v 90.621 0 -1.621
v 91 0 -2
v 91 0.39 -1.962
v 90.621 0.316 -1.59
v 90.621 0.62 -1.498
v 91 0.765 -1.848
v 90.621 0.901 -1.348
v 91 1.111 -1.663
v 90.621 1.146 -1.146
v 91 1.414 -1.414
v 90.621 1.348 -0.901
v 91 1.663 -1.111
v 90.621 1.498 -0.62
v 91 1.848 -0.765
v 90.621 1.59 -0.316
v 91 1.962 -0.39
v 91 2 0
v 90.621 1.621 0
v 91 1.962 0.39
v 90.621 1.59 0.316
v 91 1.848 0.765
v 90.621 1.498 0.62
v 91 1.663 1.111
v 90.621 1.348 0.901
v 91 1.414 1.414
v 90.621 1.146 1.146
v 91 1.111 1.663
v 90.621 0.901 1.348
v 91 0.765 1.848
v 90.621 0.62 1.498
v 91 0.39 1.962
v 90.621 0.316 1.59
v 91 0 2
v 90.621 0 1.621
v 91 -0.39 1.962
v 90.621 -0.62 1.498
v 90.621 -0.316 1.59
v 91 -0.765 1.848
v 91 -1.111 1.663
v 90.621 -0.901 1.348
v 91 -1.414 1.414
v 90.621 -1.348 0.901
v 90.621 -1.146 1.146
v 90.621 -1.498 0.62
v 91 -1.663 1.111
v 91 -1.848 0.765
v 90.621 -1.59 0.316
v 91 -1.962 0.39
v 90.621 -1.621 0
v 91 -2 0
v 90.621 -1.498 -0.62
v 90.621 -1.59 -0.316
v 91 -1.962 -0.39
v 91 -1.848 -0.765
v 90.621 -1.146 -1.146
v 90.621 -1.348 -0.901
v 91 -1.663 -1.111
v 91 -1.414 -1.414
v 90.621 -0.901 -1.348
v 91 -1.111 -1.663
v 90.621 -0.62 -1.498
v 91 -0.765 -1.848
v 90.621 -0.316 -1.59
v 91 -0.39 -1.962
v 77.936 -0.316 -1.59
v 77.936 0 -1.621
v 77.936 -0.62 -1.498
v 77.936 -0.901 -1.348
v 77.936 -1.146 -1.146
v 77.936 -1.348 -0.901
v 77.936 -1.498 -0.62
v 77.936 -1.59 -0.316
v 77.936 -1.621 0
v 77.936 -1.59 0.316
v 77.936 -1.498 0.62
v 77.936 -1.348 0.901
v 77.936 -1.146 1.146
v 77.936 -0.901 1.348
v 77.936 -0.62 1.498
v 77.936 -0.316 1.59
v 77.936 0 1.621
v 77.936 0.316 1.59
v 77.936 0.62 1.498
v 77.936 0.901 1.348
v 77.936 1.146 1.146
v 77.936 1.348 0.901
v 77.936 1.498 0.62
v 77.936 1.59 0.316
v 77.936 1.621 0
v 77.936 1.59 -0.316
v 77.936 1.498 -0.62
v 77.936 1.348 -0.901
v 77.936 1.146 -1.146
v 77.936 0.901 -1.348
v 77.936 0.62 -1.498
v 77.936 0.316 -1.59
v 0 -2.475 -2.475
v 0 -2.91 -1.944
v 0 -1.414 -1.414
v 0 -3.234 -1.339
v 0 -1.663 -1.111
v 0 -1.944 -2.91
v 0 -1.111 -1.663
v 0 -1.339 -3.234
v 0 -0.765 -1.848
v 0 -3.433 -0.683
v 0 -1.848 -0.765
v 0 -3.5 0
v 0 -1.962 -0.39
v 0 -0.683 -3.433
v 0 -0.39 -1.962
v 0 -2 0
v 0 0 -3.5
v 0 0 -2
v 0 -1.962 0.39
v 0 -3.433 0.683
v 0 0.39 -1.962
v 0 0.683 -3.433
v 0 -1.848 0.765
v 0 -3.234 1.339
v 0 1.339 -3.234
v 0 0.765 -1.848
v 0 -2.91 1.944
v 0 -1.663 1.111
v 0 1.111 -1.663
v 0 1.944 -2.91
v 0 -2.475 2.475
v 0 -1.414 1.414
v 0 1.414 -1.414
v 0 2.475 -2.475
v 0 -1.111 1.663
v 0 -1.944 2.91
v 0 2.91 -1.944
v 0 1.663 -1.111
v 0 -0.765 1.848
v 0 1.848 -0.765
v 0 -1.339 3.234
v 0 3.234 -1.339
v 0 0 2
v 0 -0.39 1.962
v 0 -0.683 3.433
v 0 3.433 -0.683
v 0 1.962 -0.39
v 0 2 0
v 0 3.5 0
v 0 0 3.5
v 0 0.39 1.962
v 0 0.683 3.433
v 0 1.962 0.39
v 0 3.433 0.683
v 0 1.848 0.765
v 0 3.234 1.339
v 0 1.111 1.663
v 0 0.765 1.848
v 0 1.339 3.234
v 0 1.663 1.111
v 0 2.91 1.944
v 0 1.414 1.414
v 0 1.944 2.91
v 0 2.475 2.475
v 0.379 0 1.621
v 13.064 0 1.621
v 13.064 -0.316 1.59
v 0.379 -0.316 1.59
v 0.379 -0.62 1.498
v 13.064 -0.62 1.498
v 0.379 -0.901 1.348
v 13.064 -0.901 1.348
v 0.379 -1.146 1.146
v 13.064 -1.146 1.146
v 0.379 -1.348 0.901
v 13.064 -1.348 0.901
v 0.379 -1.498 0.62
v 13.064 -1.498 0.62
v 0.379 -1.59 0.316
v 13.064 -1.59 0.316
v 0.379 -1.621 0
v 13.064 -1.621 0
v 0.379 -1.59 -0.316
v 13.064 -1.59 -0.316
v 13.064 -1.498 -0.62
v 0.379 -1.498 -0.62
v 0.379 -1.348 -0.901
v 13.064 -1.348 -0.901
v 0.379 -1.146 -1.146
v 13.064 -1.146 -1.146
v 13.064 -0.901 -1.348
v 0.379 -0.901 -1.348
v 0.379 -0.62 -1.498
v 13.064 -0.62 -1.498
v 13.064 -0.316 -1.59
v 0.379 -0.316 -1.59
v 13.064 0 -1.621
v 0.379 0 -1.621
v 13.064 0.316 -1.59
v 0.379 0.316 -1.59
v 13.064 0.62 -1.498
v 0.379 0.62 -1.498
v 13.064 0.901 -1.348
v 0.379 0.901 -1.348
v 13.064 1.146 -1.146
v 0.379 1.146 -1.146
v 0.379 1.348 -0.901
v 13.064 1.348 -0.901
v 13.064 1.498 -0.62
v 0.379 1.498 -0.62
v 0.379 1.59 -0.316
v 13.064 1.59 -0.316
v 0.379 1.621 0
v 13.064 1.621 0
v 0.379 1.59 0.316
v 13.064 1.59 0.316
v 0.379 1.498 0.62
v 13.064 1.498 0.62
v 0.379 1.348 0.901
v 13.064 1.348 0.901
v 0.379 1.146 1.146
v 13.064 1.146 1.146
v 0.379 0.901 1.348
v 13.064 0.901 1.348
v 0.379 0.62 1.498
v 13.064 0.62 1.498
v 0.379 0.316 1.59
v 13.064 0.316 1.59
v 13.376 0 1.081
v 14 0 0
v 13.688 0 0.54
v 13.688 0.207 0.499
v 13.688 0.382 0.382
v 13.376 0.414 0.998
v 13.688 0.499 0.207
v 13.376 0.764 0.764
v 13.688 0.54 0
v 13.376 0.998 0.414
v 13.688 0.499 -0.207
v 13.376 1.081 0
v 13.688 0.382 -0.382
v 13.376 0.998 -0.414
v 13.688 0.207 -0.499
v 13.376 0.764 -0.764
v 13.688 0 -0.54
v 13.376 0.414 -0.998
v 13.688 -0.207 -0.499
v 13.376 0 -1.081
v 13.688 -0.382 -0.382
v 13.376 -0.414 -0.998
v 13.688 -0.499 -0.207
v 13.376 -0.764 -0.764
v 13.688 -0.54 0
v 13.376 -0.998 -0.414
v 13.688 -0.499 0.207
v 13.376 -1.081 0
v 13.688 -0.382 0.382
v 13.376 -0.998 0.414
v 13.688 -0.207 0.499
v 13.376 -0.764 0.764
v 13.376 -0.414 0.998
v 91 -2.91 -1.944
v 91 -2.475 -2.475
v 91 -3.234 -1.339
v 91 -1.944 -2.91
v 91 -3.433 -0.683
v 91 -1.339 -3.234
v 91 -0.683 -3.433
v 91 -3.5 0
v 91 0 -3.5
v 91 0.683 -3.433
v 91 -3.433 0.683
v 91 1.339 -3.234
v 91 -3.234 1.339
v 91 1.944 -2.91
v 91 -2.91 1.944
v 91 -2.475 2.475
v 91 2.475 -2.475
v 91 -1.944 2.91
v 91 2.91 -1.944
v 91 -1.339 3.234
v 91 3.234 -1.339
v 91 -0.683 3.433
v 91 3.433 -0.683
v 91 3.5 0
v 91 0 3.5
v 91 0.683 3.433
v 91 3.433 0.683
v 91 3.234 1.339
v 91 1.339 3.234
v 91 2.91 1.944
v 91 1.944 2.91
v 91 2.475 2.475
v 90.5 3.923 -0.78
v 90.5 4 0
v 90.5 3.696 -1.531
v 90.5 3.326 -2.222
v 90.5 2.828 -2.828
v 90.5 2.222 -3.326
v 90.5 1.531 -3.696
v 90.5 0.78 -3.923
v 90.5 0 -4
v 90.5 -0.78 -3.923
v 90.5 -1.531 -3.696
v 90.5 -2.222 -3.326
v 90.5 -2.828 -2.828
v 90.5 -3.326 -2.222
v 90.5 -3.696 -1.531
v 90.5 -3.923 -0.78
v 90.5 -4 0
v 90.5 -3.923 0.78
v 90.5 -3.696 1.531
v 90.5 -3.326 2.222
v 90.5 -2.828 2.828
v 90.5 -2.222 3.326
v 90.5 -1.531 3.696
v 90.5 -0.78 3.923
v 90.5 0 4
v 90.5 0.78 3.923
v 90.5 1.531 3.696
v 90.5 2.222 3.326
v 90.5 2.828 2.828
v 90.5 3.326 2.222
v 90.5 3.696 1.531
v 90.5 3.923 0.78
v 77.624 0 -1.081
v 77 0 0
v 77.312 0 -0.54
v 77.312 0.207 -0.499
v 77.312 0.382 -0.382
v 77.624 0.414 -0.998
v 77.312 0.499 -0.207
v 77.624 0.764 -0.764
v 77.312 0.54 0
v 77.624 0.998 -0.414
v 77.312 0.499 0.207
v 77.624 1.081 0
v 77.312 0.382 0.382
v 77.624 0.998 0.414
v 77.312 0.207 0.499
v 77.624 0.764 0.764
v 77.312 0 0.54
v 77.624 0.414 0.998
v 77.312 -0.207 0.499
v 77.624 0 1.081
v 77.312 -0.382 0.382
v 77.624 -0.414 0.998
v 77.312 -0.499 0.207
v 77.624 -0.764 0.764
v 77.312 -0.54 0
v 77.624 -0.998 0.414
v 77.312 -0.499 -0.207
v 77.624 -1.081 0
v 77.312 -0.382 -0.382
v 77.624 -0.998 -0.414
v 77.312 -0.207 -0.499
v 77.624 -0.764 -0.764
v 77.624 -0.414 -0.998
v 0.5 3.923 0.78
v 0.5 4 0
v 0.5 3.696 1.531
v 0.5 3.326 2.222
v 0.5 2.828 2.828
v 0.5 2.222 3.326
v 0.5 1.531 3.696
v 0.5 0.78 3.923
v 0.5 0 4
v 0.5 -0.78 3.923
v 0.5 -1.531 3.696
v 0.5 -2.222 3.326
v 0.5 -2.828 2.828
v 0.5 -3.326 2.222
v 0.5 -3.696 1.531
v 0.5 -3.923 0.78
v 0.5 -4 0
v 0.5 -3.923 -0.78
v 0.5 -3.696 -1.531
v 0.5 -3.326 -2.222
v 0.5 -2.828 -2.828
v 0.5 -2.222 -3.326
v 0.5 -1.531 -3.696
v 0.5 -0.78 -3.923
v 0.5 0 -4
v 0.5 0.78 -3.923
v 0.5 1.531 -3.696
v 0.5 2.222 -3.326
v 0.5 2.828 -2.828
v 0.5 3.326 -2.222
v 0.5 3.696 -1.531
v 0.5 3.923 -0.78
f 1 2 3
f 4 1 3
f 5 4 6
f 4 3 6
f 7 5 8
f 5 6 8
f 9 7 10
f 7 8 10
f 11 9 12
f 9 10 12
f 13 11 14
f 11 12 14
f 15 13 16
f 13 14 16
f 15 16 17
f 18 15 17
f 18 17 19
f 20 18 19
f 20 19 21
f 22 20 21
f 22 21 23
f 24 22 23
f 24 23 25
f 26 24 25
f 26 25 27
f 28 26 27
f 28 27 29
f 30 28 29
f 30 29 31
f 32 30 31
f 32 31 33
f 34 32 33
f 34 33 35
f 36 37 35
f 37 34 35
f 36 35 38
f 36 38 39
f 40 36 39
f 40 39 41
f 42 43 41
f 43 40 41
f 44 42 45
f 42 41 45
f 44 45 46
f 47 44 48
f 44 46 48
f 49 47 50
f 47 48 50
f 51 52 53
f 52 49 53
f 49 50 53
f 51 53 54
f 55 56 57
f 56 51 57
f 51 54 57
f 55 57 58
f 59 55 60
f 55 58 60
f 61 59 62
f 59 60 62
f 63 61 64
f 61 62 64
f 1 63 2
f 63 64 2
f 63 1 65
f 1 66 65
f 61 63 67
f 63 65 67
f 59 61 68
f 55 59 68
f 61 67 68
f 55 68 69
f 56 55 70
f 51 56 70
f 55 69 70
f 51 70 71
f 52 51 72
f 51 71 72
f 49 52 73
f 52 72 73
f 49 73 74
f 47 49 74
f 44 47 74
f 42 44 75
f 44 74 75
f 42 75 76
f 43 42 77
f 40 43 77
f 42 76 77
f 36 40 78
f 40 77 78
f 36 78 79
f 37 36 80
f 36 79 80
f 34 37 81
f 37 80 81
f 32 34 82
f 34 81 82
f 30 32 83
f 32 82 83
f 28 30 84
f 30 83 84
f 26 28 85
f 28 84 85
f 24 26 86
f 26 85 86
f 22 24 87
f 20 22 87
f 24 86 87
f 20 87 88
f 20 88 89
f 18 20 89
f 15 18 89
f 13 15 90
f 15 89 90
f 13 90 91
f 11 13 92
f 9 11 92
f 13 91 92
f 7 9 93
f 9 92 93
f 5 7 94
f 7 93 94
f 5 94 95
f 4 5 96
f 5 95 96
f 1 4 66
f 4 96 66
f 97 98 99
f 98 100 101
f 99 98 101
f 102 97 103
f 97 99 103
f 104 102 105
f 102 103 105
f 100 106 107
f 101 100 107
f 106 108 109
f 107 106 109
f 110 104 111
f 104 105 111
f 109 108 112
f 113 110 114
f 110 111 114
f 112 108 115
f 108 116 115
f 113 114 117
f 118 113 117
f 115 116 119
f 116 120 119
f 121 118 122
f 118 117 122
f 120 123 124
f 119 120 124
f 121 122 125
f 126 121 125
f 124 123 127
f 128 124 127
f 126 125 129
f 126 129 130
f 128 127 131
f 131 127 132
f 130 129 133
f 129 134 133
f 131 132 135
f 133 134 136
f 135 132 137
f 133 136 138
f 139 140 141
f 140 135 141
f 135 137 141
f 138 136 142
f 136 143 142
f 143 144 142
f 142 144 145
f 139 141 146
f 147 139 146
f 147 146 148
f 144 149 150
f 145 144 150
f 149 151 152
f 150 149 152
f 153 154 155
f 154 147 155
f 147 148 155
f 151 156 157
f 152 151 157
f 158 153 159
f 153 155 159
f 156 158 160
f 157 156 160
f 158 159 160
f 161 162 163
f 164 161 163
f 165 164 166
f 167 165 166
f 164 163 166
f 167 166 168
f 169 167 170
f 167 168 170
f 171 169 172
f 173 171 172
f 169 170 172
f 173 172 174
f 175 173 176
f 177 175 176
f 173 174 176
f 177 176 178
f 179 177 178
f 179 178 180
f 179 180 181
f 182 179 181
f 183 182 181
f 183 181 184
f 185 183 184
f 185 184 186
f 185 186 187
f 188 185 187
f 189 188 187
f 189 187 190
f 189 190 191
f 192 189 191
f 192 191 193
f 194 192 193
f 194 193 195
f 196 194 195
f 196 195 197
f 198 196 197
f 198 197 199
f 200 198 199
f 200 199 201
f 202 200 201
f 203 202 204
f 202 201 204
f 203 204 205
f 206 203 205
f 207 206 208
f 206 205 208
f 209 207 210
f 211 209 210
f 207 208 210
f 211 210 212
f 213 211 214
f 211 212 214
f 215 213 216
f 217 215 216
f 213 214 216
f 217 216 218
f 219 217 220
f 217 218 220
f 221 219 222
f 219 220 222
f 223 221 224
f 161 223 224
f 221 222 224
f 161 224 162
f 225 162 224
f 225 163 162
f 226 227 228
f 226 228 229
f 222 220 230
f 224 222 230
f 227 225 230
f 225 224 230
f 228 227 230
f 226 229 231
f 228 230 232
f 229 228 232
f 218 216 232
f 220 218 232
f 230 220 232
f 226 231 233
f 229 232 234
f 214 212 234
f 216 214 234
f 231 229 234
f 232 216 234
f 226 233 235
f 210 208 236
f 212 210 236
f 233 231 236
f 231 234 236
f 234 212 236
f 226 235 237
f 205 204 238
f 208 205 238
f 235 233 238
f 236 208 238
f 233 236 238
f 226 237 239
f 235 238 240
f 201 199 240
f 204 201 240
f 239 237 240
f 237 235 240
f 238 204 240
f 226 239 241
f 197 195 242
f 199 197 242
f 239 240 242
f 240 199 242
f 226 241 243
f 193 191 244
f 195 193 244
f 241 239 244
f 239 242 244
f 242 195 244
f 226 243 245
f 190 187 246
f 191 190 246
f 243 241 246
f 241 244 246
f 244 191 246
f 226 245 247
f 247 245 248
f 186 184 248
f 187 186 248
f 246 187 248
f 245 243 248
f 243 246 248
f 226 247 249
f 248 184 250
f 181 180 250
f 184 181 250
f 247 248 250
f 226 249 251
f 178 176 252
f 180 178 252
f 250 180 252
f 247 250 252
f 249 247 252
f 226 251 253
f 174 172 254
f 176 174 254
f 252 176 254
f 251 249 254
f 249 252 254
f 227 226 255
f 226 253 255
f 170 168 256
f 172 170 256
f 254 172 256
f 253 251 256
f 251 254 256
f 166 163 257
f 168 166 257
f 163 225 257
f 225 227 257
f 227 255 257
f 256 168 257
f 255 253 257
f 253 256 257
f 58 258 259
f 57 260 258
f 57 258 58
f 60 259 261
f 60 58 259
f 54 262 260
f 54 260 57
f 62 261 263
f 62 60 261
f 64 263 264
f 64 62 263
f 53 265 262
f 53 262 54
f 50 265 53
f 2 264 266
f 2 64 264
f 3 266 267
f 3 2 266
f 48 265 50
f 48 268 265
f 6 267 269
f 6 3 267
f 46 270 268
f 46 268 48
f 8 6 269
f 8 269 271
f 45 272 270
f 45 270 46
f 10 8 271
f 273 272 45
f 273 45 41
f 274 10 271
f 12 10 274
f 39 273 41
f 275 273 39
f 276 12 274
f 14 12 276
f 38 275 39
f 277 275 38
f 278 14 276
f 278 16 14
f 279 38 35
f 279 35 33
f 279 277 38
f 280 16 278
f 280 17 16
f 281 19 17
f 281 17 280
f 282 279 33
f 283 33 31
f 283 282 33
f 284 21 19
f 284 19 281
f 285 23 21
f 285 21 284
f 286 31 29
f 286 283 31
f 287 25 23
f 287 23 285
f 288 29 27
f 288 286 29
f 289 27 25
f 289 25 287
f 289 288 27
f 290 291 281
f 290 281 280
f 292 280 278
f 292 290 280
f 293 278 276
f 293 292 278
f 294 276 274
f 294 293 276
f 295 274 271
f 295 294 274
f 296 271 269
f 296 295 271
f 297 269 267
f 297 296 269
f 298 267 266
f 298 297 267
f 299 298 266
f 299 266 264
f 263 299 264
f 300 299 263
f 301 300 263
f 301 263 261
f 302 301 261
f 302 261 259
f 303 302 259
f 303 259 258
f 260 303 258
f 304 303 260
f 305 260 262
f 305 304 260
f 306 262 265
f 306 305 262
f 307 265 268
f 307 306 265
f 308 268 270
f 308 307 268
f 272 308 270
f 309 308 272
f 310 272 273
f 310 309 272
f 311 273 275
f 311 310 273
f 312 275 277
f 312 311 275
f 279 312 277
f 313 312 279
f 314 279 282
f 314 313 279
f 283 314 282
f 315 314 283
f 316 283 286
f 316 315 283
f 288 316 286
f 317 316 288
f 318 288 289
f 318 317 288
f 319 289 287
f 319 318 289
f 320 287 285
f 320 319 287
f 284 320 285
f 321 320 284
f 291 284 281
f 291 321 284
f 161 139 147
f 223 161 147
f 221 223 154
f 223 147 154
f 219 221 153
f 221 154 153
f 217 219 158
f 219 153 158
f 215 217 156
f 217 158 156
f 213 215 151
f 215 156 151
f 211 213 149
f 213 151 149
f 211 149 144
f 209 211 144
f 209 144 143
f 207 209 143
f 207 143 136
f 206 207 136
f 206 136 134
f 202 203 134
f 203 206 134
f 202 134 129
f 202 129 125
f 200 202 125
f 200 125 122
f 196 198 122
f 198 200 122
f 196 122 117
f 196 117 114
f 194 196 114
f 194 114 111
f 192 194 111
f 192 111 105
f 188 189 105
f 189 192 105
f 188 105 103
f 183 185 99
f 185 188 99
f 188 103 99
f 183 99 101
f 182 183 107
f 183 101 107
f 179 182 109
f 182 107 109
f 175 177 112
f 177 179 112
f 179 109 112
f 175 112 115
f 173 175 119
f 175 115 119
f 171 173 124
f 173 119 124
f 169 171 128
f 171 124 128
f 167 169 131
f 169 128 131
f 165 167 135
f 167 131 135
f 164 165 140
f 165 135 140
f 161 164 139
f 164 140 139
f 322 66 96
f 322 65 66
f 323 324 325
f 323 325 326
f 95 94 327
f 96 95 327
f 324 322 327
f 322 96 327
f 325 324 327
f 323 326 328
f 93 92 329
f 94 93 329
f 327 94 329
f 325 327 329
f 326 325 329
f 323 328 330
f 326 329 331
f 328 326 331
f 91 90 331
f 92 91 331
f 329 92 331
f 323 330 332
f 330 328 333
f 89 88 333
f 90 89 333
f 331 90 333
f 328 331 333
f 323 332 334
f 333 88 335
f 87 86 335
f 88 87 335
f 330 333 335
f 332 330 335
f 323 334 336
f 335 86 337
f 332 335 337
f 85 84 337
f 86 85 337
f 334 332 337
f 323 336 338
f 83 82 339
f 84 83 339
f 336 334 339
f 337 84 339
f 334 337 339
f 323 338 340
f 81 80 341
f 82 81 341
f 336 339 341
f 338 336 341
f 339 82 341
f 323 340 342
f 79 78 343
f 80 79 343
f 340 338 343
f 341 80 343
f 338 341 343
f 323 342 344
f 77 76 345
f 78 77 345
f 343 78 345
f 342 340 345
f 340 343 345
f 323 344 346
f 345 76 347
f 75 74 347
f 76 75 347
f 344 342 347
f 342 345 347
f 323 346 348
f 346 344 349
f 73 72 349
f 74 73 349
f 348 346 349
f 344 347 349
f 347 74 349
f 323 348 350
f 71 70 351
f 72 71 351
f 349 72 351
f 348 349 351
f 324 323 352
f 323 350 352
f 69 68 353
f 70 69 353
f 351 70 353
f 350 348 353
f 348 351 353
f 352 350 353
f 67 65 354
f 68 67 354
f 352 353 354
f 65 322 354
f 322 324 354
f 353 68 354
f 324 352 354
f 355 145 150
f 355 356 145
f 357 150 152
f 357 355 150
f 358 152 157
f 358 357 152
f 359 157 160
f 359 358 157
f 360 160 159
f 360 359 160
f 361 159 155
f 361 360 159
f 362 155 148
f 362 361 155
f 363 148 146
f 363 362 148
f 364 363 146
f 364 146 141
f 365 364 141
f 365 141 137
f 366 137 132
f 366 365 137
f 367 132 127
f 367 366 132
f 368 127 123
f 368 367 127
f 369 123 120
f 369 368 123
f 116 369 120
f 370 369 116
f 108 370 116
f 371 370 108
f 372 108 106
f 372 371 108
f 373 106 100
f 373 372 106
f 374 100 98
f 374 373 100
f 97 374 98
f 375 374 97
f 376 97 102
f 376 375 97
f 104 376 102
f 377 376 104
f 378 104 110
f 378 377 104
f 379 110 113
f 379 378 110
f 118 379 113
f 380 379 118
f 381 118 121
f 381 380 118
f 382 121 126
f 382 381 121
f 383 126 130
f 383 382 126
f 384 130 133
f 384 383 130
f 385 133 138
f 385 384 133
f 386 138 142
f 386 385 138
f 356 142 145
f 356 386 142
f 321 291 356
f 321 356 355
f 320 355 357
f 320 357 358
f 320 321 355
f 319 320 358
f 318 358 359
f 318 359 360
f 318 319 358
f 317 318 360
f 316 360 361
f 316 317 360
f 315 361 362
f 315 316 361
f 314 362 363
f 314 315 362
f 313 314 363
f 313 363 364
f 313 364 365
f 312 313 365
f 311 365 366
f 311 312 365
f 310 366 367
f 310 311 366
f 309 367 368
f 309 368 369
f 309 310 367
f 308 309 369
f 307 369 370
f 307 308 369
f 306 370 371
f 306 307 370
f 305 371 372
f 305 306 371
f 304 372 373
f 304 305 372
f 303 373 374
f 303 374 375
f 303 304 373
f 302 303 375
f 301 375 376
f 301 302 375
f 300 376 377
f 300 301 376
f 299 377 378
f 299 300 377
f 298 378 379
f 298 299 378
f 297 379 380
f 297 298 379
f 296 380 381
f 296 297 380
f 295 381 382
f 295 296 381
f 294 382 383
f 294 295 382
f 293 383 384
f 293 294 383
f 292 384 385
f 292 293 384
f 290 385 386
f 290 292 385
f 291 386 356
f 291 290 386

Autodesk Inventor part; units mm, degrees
ref_plane "YZ Plane" through (0, 0, 0) normal (1, 0, 0) x (0, 1, 0)
ref_plane "XZ Plane" through (0, 0, 0) normal (0, 1, 0) x (-1, 0, 0)
ref_plane "XY Plane" through (0, 0, 0) normal (0, 0, 1) x (1, 0, 0)
sketch "Sketch_1" plane through (0, 0, 0) normal (0, 0, 1) x (1, 0, 0)
  line L0 (91, 0) -> (0, 0)
  line L1 (0, 0) -> (0, 3.5)
  line L2 (0, 3.5) -> (0.5, 4)
  line L3 (0.5, 4) -> (90.5, 4)
  line L4 (90.5, 4) -> (91, 3.5)
  line L5 (91, 3.5) -> (91, 0)
  line L6 (91, 0) -> (0, 0)
revolve "Revolution1" add sketch "Sketch_1" angle 360 about axis through (91, 0, 0) along (1, 0, 0)
sketch "Sketch2" plane through (0, 0, 0) normal (-1, 0, 0) x (0, 0, 1)
  point P0 (0, 0)
hole "Hole1" at (0, 0, 0) direction (1, 0, 0) diameter 3.242 depth 13.0641 tip angle 120 countersink diameter 4 countersink angle 90 thread size "M4x0.7" class "6H" standard "ISO Metric profile"
sketch "Sketch3" plane through (91, 0, 0) normal (1, 0, 0) x (0, 0, -1)
  point P0 (0, 0)
hole "Hole2" at (91, 0, 0) direction (-1, 0, 0) diameter 3.242 depth 13.0641 tip angle 120 countersink diameter 4 countersink angle 90 thread size "M4x0.7" class "6H" standard "ISO Metric profile"
properties part number "SFHRW8-91-M4-N4" material "鋼、炭素鋼"
